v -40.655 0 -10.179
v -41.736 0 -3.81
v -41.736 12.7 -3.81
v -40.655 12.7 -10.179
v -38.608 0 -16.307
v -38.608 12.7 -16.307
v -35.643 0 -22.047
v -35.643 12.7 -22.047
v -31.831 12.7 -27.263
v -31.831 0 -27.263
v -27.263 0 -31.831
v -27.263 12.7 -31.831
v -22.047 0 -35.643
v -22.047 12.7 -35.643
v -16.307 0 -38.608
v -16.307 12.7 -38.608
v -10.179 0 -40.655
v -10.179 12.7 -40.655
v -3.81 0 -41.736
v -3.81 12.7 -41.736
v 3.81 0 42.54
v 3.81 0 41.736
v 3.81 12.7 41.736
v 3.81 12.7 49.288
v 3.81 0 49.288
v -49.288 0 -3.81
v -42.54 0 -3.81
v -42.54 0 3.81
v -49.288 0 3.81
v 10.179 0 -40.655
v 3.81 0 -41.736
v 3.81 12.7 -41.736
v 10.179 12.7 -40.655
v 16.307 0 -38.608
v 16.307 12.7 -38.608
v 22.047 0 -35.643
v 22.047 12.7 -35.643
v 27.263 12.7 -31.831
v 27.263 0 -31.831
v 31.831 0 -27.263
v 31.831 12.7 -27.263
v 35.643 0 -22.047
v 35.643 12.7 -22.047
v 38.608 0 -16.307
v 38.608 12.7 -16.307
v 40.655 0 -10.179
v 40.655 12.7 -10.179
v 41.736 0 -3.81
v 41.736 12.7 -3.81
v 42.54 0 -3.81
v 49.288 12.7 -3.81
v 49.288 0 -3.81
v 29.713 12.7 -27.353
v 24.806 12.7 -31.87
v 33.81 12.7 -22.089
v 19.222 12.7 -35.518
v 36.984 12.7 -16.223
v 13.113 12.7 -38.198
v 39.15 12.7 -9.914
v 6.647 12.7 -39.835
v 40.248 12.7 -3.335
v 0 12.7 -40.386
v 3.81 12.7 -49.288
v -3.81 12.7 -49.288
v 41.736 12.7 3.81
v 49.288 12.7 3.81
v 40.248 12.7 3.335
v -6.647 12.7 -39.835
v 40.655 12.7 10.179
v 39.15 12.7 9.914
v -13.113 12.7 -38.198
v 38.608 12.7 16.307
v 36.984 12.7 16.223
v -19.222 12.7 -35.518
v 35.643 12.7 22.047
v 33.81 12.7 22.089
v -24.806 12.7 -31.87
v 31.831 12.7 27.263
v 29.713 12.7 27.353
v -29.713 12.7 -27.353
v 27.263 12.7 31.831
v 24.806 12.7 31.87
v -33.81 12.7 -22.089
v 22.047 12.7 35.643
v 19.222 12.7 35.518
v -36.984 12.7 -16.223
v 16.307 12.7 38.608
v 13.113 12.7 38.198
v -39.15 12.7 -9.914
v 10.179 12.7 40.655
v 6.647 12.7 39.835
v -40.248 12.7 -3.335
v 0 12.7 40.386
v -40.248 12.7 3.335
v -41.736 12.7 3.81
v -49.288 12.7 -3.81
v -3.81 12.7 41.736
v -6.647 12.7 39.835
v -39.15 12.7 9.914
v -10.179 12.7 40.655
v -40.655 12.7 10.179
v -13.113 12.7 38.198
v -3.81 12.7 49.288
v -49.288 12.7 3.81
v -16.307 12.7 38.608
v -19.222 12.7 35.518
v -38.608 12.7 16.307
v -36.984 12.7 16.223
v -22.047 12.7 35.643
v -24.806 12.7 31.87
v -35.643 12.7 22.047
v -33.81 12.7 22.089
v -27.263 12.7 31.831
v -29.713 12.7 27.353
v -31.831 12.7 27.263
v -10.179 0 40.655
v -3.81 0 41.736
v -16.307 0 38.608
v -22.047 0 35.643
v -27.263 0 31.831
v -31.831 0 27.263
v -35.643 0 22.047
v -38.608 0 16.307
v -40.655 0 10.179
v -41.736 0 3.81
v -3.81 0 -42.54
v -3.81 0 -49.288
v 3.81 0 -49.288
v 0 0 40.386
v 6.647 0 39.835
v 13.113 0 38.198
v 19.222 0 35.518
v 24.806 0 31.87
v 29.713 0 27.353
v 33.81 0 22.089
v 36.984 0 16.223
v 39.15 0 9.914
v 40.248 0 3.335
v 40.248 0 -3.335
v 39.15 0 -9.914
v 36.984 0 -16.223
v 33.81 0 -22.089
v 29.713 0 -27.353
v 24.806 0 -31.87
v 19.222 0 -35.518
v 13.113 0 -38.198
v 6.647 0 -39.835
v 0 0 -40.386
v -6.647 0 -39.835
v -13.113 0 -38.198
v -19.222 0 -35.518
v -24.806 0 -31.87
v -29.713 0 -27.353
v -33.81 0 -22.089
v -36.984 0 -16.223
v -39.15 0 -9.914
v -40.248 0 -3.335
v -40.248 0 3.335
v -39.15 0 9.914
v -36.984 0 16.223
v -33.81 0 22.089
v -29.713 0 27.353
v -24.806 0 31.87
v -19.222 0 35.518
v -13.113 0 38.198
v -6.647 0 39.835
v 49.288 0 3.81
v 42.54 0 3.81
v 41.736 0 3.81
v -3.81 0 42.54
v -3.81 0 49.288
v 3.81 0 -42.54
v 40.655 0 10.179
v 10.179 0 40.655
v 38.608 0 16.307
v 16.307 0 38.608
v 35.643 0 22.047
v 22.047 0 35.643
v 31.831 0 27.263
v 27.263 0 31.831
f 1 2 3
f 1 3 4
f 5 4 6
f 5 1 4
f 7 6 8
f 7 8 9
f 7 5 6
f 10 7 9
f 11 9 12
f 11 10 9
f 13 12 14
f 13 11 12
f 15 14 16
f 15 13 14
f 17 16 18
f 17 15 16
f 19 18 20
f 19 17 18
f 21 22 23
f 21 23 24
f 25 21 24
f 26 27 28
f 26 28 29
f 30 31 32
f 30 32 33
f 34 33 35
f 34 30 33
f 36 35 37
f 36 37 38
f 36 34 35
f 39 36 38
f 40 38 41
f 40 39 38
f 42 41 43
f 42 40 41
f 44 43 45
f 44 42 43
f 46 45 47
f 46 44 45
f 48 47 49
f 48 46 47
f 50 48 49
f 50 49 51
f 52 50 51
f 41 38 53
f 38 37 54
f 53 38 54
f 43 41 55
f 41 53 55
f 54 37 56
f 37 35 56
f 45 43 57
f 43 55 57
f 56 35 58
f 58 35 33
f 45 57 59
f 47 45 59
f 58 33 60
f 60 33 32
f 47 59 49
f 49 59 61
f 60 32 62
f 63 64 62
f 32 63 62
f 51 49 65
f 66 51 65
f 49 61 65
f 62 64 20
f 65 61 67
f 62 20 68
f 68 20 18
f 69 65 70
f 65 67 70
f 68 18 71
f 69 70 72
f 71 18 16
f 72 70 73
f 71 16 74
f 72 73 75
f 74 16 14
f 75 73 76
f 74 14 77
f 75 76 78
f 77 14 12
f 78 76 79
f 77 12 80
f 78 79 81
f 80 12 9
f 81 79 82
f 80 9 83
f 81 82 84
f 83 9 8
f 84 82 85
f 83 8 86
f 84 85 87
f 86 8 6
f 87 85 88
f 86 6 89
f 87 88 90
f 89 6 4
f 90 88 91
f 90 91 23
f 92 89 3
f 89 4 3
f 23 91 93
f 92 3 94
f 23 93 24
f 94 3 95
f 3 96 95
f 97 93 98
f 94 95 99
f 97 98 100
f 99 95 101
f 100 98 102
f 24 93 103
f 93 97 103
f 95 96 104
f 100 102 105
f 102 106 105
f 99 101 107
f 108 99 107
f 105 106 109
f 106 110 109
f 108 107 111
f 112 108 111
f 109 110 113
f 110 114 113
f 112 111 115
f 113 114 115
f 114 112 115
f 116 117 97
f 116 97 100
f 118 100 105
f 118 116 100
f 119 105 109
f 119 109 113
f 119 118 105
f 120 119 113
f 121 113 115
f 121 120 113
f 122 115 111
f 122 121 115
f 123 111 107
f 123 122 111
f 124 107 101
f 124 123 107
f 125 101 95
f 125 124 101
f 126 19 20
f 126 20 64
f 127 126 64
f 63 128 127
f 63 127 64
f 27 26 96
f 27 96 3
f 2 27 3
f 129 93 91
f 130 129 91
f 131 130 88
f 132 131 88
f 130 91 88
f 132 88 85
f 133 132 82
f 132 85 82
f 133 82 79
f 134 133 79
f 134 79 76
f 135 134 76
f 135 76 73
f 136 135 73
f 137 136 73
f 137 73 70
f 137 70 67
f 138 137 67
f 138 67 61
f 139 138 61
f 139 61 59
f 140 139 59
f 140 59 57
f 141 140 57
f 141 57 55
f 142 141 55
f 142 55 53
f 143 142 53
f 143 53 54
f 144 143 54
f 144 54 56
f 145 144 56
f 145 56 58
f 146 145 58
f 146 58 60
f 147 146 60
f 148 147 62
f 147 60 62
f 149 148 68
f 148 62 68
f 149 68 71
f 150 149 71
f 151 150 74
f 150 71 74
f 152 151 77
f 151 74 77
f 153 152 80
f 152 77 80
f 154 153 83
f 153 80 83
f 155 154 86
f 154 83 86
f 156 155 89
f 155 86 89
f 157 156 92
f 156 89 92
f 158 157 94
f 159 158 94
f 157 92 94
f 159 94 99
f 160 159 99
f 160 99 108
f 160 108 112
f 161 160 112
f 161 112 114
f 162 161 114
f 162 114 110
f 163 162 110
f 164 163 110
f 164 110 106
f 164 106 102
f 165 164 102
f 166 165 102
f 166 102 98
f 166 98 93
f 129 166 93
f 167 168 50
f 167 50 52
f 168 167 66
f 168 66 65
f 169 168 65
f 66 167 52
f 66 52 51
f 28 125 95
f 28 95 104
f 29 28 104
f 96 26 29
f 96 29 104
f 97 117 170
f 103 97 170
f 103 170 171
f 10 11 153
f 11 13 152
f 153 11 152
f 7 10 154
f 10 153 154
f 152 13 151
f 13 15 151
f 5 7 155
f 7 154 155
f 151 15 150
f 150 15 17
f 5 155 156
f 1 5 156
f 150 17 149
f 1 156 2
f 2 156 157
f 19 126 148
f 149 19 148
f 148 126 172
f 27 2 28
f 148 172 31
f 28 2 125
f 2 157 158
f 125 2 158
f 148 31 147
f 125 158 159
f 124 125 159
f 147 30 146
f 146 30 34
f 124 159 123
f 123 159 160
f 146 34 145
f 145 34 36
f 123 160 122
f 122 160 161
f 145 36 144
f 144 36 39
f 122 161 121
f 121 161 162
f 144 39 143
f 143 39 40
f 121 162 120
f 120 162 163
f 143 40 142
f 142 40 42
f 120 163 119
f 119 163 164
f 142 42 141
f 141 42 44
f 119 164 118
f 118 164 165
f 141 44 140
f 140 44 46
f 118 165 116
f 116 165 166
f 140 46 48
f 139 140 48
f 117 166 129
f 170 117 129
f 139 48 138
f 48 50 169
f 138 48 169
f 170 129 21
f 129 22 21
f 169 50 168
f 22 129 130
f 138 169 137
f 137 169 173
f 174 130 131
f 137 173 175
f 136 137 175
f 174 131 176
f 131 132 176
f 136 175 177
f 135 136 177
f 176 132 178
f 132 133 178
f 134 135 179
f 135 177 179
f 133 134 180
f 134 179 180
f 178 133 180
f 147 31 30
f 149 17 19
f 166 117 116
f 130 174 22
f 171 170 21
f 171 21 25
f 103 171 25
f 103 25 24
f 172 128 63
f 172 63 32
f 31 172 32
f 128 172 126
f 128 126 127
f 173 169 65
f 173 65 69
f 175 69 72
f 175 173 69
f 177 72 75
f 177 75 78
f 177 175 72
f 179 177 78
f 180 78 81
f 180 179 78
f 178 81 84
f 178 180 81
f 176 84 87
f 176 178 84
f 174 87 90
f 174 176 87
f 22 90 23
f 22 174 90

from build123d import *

# Parameters (mm, degrees)
SKETCH1_R           = 42.9384162
BOSS_EXTRUDE1_DEPTH = 12.7
SKETCH6_W           = 6.747965948
SKETCH6_H           = 12.700002404
BOSS_EXTRUDE2_DEPTH = 3.81
CIRPATTERN8_COUNT   = 4
CUT_EXTRUDE3_START  = -24
CUT_EXTRUDE3_DEPTH  = 24
SKETCH10_R          = 40.386
CUT_EXTRUDE4_DEPTH  = 38.1


with BuildPart() as part:
    # Sketch1 → Boss-Extrude1 (new body)
    with BuildSketch(Plane(origin=(0, 0, 0), x_dir=(1, 0, 0), z_dir=(0, 1, 0))):
        with Locations(Location((0, 0, 0), (0, 0, 270))):
            Circle(SKETCH1_R)
    extrude(amount=BOSS_EXTRUDE1_DEPTH)

    # Sketch6 → Boss-Extrude2 (add, symmetric)
    with BuildSketch(Plane.XY):
        with Locations((45.914433226, 6.349998798)):
            Rectangle(SKETCH6_W, SKETCH6_H)
    boss_extrude2 = extrude(amount=BOSS_EXTRUDE2_DEPTH, both=True)

    # CirPattern8: Boss-Extrude2 ×4 about axis
    cirpattern8_axis = Axis((0, 0, 0), (0, 1, 0))
    for i in range(1, CIRPATTERN8_COUNT):
        add(boss_extrude2.rotate(cirpattern8_axis, i * 360 / CIRPATTERN8_COUNT))

    # Sketch8 → Cut-Extrude3 (cut)
    with BuildSketch(Plane(origin=(0, 12.7, 0), x_dir=(1, 0, 0), z_dir=(0, 1, 0)).offset(CUT_EXTRUDE3_START)):
        with BuildLine():
            Line((-41.736458882, -3.81), (-42.769048222, -3.81))
            ThreePointArc((-42.769048222, -3.81), (-30.362045269, -30.362045269), (-3.81, -42.769048222))
            Line((-3.81, -42.769048222), (-3.81, -41.736458882))
            ThreePointArc((-3.81, -41.736458882), (-29.6348452, -29.6348452), (-41.736458882, -3.81))
        make_face()
        with BuildLine():
            Line((3.81, -41.736458882), (3.81, -42.769048222))
            ThreePointArc((3.81, -42.769048222), (30.362045269, -30.362045269), (42.769048222, -3.81))
            Line((42.769048222, -3.81), (41.736458882, -3.81))
            ThreePointArc((41.736458882, -3.81), (29.6348452, -29.6348452), (3.81, -41.736458882))
        make_face()
        with BuildLine():
            ThreePointArc((42.769048222, 3.81), (30.362045269, 30.362045269), (3.81, 42.769048222))
            Line((3.81, 42.769048222), (3.81, 41.736458882))
            ThreePointArc((3.81, 41.736458882), (29.6348452, 29.6348452), (41.736458882, 3.81))
            Line((41.736458882, 3.81), (42.769048222, 3.81))
        make_face()
        with BuildLine():
            ThreePointArc((-3.81, 42.769048222), (-30.362045269, 30.362045269), (-42.769048222, 3.81))
            Line((-42.769048222, 3.81), (-41.736458882, 3.81))
            ThreePointArc((-41.736458882, 3.81), (-29.6348452, 29.6348452), (-3.81, 41.736458882))
            Line((-3.81, 41.736458882), (-3.81, 42.769048222))
        make_face()
    extrude(amount=CUT_EXTRUDE3_DEPTH, mode=Mode.SUBTRACT)

    # Sketch10 → Cut-Extrude4 (cut)
    with BuildSketch(Plane(origin=(0, 12.7, 0), x_dir=(1, 0, 0), z_dir=(0, 1, 0))):
        with Locations(Location((0, 0, 0), (0, 0, 270))):
            Circle(SKETCH10_R)
    extrude(amount=-CUT_EXTRUDE4_DEPTH, mode=Mode.SUBTRACT)


solid = part.part
